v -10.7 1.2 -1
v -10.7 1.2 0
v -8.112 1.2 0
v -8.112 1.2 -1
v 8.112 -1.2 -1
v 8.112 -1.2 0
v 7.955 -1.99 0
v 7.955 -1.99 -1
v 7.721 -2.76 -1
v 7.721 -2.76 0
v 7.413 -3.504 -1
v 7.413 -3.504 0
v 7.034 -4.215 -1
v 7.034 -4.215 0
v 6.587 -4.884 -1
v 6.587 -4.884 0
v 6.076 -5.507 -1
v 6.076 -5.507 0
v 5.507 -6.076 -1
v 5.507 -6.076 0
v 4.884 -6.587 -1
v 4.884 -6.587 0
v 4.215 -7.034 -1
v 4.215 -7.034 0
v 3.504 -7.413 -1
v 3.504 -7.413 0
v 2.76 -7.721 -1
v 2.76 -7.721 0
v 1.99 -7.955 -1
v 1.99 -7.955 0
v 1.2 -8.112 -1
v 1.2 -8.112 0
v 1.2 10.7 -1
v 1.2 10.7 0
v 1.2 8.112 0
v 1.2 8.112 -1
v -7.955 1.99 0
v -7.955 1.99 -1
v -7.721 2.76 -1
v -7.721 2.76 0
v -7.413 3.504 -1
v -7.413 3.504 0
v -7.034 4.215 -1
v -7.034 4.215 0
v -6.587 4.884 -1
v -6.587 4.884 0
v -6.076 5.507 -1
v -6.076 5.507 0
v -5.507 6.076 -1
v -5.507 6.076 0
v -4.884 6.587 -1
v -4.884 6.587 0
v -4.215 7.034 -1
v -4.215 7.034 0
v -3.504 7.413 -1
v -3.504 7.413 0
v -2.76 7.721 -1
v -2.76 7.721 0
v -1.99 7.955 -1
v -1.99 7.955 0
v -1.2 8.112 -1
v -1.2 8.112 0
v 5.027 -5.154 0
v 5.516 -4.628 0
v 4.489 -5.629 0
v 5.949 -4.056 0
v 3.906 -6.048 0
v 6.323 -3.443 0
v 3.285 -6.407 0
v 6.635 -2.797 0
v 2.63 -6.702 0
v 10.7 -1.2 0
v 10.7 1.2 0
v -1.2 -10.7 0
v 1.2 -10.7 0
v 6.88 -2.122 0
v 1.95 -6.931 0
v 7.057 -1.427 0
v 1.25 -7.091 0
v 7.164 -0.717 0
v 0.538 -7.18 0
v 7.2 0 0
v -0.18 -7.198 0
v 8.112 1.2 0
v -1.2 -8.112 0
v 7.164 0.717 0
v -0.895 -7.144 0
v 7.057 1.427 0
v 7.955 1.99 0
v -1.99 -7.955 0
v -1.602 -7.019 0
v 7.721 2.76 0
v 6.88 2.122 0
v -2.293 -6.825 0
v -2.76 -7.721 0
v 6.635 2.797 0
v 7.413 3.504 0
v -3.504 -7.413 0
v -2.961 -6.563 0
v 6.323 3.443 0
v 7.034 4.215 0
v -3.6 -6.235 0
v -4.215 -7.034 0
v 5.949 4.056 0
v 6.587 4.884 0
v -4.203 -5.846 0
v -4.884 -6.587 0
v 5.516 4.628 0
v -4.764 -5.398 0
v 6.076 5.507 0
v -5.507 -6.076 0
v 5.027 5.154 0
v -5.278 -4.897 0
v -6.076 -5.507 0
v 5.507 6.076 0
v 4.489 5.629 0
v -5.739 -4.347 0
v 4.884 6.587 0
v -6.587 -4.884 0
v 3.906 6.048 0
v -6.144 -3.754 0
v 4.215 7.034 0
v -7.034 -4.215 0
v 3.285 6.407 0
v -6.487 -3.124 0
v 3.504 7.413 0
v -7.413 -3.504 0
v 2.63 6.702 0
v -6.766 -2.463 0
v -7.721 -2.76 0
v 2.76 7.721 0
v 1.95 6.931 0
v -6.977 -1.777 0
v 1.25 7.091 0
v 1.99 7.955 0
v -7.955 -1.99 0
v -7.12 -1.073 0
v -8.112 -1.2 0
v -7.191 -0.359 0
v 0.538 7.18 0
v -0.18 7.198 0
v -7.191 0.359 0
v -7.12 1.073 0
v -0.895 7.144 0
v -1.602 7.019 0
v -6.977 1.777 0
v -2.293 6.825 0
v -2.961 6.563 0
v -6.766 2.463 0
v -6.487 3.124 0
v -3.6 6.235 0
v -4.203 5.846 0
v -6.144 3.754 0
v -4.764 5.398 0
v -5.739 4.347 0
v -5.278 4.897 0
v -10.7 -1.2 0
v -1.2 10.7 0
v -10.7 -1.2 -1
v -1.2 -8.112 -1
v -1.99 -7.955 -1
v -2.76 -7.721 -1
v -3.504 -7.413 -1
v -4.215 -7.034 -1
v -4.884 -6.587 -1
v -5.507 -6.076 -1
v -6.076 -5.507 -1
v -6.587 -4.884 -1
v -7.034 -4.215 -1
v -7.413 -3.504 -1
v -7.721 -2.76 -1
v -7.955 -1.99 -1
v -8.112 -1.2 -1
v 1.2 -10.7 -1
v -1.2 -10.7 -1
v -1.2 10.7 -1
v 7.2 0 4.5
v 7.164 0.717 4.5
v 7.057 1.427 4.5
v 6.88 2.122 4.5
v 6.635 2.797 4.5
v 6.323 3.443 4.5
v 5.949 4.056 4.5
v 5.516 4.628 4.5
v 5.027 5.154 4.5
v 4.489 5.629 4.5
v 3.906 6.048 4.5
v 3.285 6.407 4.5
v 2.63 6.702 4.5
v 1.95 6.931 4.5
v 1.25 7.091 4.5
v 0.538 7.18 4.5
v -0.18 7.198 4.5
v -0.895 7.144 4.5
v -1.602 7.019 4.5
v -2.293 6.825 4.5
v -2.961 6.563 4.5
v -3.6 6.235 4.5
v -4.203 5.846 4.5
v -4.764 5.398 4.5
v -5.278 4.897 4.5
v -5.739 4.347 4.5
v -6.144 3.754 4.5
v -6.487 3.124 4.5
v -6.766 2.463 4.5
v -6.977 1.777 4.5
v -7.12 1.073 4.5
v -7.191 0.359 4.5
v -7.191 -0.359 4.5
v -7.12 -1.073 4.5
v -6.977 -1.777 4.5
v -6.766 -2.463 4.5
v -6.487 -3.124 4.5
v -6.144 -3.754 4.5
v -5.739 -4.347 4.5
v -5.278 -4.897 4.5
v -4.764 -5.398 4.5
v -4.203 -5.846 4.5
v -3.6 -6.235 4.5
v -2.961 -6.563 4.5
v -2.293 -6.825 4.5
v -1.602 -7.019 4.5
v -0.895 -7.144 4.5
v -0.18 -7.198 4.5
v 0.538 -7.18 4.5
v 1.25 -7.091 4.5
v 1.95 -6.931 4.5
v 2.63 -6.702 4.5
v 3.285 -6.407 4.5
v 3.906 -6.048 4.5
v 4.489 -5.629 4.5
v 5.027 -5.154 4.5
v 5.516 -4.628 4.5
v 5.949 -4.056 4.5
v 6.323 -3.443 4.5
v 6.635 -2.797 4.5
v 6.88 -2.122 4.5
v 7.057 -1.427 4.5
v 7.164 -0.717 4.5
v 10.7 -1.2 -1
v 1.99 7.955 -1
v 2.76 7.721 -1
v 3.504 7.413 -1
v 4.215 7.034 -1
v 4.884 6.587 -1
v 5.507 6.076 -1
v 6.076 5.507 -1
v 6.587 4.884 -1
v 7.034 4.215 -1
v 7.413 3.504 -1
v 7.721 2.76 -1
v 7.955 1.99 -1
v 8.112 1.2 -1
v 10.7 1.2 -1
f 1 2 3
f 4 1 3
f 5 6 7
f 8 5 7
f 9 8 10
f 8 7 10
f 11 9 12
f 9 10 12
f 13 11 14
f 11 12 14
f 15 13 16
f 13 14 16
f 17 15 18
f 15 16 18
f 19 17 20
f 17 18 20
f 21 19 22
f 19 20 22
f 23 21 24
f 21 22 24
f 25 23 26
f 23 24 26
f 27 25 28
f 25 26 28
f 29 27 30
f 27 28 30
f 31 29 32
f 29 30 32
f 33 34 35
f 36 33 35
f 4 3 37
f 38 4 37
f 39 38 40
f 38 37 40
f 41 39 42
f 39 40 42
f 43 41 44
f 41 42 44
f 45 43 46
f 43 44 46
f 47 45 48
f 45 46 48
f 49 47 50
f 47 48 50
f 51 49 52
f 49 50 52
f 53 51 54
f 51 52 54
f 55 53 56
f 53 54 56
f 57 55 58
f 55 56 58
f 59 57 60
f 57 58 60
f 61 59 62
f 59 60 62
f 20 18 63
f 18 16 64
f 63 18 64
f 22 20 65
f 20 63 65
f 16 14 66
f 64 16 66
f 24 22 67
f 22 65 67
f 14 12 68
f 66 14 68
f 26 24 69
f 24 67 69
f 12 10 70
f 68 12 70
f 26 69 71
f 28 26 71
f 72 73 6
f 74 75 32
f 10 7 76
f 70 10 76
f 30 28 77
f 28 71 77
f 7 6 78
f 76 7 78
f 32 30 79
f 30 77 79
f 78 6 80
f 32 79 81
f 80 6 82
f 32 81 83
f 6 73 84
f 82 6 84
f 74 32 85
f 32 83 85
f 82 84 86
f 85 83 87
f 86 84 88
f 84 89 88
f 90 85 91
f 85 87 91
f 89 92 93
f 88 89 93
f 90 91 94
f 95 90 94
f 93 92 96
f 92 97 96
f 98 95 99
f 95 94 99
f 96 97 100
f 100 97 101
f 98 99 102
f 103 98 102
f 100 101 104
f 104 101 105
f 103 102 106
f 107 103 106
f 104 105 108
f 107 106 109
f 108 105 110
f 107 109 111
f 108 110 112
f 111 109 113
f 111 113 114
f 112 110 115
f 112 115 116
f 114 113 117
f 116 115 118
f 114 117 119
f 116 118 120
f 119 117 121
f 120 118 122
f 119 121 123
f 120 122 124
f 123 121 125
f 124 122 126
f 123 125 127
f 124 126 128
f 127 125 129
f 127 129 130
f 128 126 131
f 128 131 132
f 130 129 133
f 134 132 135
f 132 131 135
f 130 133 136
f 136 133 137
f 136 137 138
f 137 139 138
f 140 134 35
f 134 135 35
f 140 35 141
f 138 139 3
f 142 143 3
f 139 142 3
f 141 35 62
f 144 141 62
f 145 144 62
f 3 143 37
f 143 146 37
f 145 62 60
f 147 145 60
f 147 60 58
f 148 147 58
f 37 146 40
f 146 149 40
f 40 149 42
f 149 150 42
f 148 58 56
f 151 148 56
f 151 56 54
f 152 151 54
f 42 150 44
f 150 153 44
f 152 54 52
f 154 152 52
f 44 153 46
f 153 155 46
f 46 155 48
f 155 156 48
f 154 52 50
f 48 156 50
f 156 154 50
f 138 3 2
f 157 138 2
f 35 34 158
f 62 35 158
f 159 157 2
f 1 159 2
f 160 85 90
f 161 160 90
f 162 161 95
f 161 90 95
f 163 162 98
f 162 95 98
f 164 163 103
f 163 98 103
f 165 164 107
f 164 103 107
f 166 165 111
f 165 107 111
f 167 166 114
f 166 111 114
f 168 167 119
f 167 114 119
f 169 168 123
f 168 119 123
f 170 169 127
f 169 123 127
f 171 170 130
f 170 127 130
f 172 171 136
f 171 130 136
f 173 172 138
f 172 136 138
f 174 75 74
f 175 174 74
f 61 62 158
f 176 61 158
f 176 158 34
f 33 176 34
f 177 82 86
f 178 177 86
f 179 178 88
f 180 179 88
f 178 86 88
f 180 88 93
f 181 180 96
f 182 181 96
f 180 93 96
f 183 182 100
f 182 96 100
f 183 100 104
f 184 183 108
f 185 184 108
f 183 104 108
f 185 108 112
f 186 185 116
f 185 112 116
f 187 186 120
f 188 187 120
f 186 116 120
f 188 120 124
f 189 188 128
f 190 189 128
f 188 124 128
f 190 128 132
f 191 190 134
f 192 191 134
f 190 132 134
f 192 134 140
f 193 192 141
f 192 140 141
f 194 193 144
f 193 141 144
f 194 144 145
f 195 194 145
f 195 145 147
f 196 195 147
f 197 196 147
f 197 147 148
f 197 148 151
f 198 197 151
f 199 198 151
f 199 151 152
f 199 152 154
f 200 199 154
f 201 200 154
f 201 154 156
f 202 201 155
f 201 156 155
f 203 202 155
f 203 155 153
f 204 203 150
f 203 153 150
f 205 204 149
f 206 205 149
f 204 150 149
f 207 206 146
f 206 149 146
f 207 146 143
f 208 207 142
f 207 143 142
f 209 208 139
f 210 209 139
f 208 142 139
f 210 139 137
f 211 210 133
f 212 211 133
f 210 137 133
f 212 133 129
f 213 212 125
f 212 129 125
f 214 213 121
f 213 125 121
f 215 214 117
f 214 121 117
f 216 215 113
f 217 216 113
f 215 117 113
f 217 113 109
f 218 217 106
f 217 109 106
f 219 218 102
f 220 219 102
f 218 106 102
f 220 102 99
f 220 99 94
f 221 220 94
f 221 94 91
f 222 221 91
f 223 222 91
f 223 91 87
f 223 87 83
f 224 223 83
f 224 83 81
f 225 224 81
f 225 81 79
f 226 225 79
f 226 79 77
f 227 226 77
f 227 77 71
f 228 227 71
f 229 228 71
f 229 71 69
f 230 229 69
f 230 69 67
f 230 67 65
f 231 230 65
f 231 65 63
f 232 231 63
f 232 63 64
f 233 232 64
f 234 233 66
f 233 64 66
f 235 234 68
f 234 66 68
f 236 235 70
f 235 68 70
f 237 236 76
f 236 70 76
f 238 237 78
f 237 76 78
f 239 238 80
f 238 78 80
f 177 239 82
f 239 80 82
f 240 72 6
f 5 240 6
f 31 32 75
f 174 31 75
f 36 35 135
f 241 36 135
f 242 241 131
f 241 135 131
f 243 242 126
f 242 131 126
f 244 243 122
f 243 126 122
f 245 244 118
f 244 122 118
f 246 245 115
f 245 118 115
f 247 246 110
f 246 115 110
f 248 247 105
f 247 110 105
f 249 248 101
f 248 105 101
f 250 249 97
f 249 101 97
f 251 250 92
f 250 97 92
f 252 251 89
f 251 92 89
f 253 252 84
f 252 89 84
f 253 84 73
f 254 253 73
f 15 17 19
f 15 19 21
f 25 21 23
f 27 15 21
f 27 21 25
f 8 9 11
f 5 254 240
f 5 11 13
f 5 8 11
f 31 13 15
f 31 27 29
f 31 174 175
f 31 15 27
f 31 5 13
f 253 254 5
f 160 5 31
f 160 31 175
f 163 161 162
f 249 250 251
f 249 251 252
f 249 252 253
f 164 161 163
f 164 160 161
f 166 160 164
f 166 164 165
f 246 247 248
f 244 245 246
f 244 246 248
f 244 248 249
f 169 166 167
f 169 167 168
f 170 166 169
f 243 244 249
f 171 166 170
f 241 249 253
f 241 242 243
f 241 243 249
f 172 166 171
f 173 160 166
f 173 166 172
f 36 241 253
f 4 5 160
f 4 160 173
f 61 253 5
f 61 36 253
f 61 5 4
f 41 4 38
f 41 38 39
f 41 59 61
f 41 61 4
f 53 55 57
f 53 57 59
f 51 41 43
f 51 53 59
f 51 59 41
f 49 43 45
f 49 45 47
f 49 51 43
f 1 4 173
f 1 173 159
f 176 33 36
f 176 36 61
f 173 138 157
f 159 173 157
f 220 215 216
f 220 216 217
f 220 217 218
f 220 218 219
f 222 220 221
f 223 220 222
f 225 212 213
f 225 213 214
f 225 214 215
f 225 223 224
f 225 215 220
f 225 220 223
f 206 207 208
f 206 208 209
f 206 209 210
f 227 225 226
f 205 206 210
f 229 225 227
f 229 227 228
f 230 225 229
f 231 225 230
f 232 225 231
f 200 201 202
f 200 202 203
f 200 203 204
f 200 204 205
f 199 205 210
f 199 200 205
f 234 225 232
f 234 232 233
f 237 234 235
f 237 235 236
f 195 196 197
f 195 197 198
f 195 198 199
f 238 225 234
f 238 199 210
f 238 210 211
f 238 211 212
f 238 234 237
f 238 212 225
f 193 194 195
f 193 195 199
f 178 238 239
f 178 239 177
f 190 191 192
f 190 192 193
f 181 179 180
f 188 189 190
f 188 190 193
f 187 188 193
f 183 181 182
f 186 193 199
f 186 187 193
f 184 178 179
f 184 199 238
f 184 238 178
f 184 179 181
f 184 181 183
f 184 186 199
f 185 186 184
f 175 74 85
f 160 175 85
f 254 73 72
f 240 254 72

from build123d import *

# Parameters (mm, degrees)
SKETCH1_R           = 7.2
BOSS_EXTRUDE1_DEPTH = 4.5
BOSS_EXTRUDE3_DEPTH = 1


with BuildPart() as part:
    # Sketch1 → Boss-Extrude1 (new body)
    with BuildSketch(Plane.XY):
        Circle(SKETCH1_R)
    extrude(amount=BOSS_EXTRUDE1_DEPTH)

    # Sketch4 → Boss-Extrude3 (add)
    with BuildSketch(Plane(origin=(0, 0, 0), x_dir=(-1, 0, 0), z_dir=(0, 0, -1))):
        with BuildLine():
            Line((10.7, 1.2), (8.111719916, 1.2))
            ThreePointArc((8.111719916, 1.2), (5.798275606, 5.798275606), (1.2, 8.111719916))
            Line((1.2, 8.111719916), (1.2, 10.7))
            Line((1.2, 10.7), (-1.2, 10.7))
            Line((-1.2, 10.7), (-1.2, 8.111719916))
            ThreePointArc((-1.2, 8.111719916), (-5.798275606, 5.798275606), (-8.111719916, 1.2))
            Line((-8.111719916, 1.2), (-10.7, 1.2))
            Line((-10.7, 1.2), (-10.7, -1.2))
            Line((-10.7, -1.2), (-8.111719916, -1.2))
            ThreePointArc((-8.111719916, -1.2), (-5.798275606, -5.798275606), (-1.2, -8.111719916))
            Line((-1.2, -8.111719916), (-1.2, -10.7))
            Line((-1.2, -10.7), (1.2, -10.7))
            Line((1.2, -10.7), (1.2, -8.111719916))
            ThreePointArc((1.2, -8.111719916), (5.798275606, -5.798275606), (8.111719916, -1.2))
            Line((8.111719916, -1.2), (10.7, -1.2))
            Line((10.7, -1.2), (10.7, 1.2))
        make_face()
    extrude(amount=BOSS_EXTRUDE3_DEPTH)


solid = part.part
